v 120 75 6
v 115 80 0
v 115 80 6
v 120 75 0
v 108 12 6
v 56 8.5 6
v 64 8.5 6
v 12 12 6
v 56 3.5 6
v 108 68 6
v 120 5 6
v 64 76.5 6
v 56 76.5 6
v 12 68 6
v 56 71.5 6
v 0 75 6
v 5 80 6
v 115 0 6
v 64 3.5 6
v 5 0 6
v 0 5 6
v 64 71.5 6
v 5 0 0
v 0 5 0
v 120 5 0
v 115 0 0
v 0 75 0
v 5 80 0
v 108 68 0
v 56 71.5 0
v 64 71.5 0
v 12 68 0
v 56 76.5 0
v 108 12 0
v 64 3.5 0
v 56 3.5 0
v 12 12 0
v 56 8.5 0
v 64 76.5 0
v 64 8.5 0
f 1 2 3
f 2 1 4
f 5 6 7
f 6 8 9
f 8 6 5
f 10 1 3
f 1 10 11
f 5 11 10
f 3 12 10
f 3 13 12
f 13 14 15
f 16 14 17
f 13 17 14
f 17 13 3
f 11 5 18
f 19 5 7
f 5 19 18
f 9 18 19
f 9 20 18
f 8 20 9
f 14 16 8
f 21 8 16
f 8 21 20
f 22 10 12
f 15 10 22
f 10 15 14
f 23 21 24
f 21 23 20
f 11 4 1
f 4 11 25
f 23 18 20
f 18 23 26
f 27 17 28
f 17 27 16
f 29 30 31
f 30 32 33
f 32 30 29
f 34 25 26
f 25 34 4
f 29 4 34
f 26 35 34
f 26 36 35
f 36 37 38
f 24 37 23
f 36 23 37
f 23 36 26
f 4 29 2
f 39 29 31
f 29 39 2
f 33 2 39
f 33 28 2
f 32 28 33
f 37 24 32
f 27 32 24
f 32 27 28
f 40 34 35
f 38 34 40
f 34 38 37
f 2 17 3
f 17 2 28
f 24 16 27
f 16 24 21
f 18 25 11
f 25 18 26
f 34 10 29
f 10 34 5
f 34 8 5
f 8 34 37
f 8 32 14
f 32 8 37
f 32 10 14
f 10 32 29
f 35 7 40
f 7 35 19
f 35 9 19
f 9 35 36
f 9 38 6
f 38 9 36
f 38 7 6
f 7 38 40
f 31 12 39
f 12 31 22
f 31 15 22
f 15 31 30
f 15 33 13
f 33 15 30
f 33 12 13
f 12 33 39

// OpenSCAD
$fn = 32;

// ----------------------------------------------------------------------
// Frame plate: 120 x 80 frame, 12 mm rails
// ----------------------------------------------------------------------

// --- parameters (mm) ---
plate_l = 120;            // plate length, X
plate_w = 80;             // plate width, Y
plate_t = 6;              // plate thickness, Z (extrusion height)
corner_c = 5;             // corner chamfer
frame_bar = 12;           // frame rail width
slot_l = 8;               // adjustment slot length
slot_w = 5;               // adjustment slot width

win_l = plate_l - 2 * frame_bar;  // window length
win_w = plate_w - 2 * frame_bar;  // window width

profile = [[5, 0], [115, 0], [120, 5], [120, 75], [115, 80], [5, 80], [0, 75], [0, 5]];  // primary outline, 8 points, counter clockwise
void_1 = [[12, 12], [108, 12], [108, 68], [12, 68]];  // the window, 4 points
void_2 = [[56, 3.5], [64, 3.5], [64, 8.5], [56, 8.5]];  // adjustment slot, 4 points
void_3 = [[56, 71.5], [64, 71.5], [64, 76.5], [56, 76.5]];  // adjustment slot, 4 points

// --- the one profile operation ---
difference() {
  linear_extrude(height = plate_t) polygon(points = profile);
  translate([0, 0, -1])
    linear_extrude(height = plate_t + 2) polygon(points = void_1);
  translate([0, 0, -1])
    linear_extrude(height = plate_t + 2) polygon(points = void_2);
  translate([0, 0, -1])
    linear_extrude(height = plate_t + 2) polygon(points = void_3);
}
